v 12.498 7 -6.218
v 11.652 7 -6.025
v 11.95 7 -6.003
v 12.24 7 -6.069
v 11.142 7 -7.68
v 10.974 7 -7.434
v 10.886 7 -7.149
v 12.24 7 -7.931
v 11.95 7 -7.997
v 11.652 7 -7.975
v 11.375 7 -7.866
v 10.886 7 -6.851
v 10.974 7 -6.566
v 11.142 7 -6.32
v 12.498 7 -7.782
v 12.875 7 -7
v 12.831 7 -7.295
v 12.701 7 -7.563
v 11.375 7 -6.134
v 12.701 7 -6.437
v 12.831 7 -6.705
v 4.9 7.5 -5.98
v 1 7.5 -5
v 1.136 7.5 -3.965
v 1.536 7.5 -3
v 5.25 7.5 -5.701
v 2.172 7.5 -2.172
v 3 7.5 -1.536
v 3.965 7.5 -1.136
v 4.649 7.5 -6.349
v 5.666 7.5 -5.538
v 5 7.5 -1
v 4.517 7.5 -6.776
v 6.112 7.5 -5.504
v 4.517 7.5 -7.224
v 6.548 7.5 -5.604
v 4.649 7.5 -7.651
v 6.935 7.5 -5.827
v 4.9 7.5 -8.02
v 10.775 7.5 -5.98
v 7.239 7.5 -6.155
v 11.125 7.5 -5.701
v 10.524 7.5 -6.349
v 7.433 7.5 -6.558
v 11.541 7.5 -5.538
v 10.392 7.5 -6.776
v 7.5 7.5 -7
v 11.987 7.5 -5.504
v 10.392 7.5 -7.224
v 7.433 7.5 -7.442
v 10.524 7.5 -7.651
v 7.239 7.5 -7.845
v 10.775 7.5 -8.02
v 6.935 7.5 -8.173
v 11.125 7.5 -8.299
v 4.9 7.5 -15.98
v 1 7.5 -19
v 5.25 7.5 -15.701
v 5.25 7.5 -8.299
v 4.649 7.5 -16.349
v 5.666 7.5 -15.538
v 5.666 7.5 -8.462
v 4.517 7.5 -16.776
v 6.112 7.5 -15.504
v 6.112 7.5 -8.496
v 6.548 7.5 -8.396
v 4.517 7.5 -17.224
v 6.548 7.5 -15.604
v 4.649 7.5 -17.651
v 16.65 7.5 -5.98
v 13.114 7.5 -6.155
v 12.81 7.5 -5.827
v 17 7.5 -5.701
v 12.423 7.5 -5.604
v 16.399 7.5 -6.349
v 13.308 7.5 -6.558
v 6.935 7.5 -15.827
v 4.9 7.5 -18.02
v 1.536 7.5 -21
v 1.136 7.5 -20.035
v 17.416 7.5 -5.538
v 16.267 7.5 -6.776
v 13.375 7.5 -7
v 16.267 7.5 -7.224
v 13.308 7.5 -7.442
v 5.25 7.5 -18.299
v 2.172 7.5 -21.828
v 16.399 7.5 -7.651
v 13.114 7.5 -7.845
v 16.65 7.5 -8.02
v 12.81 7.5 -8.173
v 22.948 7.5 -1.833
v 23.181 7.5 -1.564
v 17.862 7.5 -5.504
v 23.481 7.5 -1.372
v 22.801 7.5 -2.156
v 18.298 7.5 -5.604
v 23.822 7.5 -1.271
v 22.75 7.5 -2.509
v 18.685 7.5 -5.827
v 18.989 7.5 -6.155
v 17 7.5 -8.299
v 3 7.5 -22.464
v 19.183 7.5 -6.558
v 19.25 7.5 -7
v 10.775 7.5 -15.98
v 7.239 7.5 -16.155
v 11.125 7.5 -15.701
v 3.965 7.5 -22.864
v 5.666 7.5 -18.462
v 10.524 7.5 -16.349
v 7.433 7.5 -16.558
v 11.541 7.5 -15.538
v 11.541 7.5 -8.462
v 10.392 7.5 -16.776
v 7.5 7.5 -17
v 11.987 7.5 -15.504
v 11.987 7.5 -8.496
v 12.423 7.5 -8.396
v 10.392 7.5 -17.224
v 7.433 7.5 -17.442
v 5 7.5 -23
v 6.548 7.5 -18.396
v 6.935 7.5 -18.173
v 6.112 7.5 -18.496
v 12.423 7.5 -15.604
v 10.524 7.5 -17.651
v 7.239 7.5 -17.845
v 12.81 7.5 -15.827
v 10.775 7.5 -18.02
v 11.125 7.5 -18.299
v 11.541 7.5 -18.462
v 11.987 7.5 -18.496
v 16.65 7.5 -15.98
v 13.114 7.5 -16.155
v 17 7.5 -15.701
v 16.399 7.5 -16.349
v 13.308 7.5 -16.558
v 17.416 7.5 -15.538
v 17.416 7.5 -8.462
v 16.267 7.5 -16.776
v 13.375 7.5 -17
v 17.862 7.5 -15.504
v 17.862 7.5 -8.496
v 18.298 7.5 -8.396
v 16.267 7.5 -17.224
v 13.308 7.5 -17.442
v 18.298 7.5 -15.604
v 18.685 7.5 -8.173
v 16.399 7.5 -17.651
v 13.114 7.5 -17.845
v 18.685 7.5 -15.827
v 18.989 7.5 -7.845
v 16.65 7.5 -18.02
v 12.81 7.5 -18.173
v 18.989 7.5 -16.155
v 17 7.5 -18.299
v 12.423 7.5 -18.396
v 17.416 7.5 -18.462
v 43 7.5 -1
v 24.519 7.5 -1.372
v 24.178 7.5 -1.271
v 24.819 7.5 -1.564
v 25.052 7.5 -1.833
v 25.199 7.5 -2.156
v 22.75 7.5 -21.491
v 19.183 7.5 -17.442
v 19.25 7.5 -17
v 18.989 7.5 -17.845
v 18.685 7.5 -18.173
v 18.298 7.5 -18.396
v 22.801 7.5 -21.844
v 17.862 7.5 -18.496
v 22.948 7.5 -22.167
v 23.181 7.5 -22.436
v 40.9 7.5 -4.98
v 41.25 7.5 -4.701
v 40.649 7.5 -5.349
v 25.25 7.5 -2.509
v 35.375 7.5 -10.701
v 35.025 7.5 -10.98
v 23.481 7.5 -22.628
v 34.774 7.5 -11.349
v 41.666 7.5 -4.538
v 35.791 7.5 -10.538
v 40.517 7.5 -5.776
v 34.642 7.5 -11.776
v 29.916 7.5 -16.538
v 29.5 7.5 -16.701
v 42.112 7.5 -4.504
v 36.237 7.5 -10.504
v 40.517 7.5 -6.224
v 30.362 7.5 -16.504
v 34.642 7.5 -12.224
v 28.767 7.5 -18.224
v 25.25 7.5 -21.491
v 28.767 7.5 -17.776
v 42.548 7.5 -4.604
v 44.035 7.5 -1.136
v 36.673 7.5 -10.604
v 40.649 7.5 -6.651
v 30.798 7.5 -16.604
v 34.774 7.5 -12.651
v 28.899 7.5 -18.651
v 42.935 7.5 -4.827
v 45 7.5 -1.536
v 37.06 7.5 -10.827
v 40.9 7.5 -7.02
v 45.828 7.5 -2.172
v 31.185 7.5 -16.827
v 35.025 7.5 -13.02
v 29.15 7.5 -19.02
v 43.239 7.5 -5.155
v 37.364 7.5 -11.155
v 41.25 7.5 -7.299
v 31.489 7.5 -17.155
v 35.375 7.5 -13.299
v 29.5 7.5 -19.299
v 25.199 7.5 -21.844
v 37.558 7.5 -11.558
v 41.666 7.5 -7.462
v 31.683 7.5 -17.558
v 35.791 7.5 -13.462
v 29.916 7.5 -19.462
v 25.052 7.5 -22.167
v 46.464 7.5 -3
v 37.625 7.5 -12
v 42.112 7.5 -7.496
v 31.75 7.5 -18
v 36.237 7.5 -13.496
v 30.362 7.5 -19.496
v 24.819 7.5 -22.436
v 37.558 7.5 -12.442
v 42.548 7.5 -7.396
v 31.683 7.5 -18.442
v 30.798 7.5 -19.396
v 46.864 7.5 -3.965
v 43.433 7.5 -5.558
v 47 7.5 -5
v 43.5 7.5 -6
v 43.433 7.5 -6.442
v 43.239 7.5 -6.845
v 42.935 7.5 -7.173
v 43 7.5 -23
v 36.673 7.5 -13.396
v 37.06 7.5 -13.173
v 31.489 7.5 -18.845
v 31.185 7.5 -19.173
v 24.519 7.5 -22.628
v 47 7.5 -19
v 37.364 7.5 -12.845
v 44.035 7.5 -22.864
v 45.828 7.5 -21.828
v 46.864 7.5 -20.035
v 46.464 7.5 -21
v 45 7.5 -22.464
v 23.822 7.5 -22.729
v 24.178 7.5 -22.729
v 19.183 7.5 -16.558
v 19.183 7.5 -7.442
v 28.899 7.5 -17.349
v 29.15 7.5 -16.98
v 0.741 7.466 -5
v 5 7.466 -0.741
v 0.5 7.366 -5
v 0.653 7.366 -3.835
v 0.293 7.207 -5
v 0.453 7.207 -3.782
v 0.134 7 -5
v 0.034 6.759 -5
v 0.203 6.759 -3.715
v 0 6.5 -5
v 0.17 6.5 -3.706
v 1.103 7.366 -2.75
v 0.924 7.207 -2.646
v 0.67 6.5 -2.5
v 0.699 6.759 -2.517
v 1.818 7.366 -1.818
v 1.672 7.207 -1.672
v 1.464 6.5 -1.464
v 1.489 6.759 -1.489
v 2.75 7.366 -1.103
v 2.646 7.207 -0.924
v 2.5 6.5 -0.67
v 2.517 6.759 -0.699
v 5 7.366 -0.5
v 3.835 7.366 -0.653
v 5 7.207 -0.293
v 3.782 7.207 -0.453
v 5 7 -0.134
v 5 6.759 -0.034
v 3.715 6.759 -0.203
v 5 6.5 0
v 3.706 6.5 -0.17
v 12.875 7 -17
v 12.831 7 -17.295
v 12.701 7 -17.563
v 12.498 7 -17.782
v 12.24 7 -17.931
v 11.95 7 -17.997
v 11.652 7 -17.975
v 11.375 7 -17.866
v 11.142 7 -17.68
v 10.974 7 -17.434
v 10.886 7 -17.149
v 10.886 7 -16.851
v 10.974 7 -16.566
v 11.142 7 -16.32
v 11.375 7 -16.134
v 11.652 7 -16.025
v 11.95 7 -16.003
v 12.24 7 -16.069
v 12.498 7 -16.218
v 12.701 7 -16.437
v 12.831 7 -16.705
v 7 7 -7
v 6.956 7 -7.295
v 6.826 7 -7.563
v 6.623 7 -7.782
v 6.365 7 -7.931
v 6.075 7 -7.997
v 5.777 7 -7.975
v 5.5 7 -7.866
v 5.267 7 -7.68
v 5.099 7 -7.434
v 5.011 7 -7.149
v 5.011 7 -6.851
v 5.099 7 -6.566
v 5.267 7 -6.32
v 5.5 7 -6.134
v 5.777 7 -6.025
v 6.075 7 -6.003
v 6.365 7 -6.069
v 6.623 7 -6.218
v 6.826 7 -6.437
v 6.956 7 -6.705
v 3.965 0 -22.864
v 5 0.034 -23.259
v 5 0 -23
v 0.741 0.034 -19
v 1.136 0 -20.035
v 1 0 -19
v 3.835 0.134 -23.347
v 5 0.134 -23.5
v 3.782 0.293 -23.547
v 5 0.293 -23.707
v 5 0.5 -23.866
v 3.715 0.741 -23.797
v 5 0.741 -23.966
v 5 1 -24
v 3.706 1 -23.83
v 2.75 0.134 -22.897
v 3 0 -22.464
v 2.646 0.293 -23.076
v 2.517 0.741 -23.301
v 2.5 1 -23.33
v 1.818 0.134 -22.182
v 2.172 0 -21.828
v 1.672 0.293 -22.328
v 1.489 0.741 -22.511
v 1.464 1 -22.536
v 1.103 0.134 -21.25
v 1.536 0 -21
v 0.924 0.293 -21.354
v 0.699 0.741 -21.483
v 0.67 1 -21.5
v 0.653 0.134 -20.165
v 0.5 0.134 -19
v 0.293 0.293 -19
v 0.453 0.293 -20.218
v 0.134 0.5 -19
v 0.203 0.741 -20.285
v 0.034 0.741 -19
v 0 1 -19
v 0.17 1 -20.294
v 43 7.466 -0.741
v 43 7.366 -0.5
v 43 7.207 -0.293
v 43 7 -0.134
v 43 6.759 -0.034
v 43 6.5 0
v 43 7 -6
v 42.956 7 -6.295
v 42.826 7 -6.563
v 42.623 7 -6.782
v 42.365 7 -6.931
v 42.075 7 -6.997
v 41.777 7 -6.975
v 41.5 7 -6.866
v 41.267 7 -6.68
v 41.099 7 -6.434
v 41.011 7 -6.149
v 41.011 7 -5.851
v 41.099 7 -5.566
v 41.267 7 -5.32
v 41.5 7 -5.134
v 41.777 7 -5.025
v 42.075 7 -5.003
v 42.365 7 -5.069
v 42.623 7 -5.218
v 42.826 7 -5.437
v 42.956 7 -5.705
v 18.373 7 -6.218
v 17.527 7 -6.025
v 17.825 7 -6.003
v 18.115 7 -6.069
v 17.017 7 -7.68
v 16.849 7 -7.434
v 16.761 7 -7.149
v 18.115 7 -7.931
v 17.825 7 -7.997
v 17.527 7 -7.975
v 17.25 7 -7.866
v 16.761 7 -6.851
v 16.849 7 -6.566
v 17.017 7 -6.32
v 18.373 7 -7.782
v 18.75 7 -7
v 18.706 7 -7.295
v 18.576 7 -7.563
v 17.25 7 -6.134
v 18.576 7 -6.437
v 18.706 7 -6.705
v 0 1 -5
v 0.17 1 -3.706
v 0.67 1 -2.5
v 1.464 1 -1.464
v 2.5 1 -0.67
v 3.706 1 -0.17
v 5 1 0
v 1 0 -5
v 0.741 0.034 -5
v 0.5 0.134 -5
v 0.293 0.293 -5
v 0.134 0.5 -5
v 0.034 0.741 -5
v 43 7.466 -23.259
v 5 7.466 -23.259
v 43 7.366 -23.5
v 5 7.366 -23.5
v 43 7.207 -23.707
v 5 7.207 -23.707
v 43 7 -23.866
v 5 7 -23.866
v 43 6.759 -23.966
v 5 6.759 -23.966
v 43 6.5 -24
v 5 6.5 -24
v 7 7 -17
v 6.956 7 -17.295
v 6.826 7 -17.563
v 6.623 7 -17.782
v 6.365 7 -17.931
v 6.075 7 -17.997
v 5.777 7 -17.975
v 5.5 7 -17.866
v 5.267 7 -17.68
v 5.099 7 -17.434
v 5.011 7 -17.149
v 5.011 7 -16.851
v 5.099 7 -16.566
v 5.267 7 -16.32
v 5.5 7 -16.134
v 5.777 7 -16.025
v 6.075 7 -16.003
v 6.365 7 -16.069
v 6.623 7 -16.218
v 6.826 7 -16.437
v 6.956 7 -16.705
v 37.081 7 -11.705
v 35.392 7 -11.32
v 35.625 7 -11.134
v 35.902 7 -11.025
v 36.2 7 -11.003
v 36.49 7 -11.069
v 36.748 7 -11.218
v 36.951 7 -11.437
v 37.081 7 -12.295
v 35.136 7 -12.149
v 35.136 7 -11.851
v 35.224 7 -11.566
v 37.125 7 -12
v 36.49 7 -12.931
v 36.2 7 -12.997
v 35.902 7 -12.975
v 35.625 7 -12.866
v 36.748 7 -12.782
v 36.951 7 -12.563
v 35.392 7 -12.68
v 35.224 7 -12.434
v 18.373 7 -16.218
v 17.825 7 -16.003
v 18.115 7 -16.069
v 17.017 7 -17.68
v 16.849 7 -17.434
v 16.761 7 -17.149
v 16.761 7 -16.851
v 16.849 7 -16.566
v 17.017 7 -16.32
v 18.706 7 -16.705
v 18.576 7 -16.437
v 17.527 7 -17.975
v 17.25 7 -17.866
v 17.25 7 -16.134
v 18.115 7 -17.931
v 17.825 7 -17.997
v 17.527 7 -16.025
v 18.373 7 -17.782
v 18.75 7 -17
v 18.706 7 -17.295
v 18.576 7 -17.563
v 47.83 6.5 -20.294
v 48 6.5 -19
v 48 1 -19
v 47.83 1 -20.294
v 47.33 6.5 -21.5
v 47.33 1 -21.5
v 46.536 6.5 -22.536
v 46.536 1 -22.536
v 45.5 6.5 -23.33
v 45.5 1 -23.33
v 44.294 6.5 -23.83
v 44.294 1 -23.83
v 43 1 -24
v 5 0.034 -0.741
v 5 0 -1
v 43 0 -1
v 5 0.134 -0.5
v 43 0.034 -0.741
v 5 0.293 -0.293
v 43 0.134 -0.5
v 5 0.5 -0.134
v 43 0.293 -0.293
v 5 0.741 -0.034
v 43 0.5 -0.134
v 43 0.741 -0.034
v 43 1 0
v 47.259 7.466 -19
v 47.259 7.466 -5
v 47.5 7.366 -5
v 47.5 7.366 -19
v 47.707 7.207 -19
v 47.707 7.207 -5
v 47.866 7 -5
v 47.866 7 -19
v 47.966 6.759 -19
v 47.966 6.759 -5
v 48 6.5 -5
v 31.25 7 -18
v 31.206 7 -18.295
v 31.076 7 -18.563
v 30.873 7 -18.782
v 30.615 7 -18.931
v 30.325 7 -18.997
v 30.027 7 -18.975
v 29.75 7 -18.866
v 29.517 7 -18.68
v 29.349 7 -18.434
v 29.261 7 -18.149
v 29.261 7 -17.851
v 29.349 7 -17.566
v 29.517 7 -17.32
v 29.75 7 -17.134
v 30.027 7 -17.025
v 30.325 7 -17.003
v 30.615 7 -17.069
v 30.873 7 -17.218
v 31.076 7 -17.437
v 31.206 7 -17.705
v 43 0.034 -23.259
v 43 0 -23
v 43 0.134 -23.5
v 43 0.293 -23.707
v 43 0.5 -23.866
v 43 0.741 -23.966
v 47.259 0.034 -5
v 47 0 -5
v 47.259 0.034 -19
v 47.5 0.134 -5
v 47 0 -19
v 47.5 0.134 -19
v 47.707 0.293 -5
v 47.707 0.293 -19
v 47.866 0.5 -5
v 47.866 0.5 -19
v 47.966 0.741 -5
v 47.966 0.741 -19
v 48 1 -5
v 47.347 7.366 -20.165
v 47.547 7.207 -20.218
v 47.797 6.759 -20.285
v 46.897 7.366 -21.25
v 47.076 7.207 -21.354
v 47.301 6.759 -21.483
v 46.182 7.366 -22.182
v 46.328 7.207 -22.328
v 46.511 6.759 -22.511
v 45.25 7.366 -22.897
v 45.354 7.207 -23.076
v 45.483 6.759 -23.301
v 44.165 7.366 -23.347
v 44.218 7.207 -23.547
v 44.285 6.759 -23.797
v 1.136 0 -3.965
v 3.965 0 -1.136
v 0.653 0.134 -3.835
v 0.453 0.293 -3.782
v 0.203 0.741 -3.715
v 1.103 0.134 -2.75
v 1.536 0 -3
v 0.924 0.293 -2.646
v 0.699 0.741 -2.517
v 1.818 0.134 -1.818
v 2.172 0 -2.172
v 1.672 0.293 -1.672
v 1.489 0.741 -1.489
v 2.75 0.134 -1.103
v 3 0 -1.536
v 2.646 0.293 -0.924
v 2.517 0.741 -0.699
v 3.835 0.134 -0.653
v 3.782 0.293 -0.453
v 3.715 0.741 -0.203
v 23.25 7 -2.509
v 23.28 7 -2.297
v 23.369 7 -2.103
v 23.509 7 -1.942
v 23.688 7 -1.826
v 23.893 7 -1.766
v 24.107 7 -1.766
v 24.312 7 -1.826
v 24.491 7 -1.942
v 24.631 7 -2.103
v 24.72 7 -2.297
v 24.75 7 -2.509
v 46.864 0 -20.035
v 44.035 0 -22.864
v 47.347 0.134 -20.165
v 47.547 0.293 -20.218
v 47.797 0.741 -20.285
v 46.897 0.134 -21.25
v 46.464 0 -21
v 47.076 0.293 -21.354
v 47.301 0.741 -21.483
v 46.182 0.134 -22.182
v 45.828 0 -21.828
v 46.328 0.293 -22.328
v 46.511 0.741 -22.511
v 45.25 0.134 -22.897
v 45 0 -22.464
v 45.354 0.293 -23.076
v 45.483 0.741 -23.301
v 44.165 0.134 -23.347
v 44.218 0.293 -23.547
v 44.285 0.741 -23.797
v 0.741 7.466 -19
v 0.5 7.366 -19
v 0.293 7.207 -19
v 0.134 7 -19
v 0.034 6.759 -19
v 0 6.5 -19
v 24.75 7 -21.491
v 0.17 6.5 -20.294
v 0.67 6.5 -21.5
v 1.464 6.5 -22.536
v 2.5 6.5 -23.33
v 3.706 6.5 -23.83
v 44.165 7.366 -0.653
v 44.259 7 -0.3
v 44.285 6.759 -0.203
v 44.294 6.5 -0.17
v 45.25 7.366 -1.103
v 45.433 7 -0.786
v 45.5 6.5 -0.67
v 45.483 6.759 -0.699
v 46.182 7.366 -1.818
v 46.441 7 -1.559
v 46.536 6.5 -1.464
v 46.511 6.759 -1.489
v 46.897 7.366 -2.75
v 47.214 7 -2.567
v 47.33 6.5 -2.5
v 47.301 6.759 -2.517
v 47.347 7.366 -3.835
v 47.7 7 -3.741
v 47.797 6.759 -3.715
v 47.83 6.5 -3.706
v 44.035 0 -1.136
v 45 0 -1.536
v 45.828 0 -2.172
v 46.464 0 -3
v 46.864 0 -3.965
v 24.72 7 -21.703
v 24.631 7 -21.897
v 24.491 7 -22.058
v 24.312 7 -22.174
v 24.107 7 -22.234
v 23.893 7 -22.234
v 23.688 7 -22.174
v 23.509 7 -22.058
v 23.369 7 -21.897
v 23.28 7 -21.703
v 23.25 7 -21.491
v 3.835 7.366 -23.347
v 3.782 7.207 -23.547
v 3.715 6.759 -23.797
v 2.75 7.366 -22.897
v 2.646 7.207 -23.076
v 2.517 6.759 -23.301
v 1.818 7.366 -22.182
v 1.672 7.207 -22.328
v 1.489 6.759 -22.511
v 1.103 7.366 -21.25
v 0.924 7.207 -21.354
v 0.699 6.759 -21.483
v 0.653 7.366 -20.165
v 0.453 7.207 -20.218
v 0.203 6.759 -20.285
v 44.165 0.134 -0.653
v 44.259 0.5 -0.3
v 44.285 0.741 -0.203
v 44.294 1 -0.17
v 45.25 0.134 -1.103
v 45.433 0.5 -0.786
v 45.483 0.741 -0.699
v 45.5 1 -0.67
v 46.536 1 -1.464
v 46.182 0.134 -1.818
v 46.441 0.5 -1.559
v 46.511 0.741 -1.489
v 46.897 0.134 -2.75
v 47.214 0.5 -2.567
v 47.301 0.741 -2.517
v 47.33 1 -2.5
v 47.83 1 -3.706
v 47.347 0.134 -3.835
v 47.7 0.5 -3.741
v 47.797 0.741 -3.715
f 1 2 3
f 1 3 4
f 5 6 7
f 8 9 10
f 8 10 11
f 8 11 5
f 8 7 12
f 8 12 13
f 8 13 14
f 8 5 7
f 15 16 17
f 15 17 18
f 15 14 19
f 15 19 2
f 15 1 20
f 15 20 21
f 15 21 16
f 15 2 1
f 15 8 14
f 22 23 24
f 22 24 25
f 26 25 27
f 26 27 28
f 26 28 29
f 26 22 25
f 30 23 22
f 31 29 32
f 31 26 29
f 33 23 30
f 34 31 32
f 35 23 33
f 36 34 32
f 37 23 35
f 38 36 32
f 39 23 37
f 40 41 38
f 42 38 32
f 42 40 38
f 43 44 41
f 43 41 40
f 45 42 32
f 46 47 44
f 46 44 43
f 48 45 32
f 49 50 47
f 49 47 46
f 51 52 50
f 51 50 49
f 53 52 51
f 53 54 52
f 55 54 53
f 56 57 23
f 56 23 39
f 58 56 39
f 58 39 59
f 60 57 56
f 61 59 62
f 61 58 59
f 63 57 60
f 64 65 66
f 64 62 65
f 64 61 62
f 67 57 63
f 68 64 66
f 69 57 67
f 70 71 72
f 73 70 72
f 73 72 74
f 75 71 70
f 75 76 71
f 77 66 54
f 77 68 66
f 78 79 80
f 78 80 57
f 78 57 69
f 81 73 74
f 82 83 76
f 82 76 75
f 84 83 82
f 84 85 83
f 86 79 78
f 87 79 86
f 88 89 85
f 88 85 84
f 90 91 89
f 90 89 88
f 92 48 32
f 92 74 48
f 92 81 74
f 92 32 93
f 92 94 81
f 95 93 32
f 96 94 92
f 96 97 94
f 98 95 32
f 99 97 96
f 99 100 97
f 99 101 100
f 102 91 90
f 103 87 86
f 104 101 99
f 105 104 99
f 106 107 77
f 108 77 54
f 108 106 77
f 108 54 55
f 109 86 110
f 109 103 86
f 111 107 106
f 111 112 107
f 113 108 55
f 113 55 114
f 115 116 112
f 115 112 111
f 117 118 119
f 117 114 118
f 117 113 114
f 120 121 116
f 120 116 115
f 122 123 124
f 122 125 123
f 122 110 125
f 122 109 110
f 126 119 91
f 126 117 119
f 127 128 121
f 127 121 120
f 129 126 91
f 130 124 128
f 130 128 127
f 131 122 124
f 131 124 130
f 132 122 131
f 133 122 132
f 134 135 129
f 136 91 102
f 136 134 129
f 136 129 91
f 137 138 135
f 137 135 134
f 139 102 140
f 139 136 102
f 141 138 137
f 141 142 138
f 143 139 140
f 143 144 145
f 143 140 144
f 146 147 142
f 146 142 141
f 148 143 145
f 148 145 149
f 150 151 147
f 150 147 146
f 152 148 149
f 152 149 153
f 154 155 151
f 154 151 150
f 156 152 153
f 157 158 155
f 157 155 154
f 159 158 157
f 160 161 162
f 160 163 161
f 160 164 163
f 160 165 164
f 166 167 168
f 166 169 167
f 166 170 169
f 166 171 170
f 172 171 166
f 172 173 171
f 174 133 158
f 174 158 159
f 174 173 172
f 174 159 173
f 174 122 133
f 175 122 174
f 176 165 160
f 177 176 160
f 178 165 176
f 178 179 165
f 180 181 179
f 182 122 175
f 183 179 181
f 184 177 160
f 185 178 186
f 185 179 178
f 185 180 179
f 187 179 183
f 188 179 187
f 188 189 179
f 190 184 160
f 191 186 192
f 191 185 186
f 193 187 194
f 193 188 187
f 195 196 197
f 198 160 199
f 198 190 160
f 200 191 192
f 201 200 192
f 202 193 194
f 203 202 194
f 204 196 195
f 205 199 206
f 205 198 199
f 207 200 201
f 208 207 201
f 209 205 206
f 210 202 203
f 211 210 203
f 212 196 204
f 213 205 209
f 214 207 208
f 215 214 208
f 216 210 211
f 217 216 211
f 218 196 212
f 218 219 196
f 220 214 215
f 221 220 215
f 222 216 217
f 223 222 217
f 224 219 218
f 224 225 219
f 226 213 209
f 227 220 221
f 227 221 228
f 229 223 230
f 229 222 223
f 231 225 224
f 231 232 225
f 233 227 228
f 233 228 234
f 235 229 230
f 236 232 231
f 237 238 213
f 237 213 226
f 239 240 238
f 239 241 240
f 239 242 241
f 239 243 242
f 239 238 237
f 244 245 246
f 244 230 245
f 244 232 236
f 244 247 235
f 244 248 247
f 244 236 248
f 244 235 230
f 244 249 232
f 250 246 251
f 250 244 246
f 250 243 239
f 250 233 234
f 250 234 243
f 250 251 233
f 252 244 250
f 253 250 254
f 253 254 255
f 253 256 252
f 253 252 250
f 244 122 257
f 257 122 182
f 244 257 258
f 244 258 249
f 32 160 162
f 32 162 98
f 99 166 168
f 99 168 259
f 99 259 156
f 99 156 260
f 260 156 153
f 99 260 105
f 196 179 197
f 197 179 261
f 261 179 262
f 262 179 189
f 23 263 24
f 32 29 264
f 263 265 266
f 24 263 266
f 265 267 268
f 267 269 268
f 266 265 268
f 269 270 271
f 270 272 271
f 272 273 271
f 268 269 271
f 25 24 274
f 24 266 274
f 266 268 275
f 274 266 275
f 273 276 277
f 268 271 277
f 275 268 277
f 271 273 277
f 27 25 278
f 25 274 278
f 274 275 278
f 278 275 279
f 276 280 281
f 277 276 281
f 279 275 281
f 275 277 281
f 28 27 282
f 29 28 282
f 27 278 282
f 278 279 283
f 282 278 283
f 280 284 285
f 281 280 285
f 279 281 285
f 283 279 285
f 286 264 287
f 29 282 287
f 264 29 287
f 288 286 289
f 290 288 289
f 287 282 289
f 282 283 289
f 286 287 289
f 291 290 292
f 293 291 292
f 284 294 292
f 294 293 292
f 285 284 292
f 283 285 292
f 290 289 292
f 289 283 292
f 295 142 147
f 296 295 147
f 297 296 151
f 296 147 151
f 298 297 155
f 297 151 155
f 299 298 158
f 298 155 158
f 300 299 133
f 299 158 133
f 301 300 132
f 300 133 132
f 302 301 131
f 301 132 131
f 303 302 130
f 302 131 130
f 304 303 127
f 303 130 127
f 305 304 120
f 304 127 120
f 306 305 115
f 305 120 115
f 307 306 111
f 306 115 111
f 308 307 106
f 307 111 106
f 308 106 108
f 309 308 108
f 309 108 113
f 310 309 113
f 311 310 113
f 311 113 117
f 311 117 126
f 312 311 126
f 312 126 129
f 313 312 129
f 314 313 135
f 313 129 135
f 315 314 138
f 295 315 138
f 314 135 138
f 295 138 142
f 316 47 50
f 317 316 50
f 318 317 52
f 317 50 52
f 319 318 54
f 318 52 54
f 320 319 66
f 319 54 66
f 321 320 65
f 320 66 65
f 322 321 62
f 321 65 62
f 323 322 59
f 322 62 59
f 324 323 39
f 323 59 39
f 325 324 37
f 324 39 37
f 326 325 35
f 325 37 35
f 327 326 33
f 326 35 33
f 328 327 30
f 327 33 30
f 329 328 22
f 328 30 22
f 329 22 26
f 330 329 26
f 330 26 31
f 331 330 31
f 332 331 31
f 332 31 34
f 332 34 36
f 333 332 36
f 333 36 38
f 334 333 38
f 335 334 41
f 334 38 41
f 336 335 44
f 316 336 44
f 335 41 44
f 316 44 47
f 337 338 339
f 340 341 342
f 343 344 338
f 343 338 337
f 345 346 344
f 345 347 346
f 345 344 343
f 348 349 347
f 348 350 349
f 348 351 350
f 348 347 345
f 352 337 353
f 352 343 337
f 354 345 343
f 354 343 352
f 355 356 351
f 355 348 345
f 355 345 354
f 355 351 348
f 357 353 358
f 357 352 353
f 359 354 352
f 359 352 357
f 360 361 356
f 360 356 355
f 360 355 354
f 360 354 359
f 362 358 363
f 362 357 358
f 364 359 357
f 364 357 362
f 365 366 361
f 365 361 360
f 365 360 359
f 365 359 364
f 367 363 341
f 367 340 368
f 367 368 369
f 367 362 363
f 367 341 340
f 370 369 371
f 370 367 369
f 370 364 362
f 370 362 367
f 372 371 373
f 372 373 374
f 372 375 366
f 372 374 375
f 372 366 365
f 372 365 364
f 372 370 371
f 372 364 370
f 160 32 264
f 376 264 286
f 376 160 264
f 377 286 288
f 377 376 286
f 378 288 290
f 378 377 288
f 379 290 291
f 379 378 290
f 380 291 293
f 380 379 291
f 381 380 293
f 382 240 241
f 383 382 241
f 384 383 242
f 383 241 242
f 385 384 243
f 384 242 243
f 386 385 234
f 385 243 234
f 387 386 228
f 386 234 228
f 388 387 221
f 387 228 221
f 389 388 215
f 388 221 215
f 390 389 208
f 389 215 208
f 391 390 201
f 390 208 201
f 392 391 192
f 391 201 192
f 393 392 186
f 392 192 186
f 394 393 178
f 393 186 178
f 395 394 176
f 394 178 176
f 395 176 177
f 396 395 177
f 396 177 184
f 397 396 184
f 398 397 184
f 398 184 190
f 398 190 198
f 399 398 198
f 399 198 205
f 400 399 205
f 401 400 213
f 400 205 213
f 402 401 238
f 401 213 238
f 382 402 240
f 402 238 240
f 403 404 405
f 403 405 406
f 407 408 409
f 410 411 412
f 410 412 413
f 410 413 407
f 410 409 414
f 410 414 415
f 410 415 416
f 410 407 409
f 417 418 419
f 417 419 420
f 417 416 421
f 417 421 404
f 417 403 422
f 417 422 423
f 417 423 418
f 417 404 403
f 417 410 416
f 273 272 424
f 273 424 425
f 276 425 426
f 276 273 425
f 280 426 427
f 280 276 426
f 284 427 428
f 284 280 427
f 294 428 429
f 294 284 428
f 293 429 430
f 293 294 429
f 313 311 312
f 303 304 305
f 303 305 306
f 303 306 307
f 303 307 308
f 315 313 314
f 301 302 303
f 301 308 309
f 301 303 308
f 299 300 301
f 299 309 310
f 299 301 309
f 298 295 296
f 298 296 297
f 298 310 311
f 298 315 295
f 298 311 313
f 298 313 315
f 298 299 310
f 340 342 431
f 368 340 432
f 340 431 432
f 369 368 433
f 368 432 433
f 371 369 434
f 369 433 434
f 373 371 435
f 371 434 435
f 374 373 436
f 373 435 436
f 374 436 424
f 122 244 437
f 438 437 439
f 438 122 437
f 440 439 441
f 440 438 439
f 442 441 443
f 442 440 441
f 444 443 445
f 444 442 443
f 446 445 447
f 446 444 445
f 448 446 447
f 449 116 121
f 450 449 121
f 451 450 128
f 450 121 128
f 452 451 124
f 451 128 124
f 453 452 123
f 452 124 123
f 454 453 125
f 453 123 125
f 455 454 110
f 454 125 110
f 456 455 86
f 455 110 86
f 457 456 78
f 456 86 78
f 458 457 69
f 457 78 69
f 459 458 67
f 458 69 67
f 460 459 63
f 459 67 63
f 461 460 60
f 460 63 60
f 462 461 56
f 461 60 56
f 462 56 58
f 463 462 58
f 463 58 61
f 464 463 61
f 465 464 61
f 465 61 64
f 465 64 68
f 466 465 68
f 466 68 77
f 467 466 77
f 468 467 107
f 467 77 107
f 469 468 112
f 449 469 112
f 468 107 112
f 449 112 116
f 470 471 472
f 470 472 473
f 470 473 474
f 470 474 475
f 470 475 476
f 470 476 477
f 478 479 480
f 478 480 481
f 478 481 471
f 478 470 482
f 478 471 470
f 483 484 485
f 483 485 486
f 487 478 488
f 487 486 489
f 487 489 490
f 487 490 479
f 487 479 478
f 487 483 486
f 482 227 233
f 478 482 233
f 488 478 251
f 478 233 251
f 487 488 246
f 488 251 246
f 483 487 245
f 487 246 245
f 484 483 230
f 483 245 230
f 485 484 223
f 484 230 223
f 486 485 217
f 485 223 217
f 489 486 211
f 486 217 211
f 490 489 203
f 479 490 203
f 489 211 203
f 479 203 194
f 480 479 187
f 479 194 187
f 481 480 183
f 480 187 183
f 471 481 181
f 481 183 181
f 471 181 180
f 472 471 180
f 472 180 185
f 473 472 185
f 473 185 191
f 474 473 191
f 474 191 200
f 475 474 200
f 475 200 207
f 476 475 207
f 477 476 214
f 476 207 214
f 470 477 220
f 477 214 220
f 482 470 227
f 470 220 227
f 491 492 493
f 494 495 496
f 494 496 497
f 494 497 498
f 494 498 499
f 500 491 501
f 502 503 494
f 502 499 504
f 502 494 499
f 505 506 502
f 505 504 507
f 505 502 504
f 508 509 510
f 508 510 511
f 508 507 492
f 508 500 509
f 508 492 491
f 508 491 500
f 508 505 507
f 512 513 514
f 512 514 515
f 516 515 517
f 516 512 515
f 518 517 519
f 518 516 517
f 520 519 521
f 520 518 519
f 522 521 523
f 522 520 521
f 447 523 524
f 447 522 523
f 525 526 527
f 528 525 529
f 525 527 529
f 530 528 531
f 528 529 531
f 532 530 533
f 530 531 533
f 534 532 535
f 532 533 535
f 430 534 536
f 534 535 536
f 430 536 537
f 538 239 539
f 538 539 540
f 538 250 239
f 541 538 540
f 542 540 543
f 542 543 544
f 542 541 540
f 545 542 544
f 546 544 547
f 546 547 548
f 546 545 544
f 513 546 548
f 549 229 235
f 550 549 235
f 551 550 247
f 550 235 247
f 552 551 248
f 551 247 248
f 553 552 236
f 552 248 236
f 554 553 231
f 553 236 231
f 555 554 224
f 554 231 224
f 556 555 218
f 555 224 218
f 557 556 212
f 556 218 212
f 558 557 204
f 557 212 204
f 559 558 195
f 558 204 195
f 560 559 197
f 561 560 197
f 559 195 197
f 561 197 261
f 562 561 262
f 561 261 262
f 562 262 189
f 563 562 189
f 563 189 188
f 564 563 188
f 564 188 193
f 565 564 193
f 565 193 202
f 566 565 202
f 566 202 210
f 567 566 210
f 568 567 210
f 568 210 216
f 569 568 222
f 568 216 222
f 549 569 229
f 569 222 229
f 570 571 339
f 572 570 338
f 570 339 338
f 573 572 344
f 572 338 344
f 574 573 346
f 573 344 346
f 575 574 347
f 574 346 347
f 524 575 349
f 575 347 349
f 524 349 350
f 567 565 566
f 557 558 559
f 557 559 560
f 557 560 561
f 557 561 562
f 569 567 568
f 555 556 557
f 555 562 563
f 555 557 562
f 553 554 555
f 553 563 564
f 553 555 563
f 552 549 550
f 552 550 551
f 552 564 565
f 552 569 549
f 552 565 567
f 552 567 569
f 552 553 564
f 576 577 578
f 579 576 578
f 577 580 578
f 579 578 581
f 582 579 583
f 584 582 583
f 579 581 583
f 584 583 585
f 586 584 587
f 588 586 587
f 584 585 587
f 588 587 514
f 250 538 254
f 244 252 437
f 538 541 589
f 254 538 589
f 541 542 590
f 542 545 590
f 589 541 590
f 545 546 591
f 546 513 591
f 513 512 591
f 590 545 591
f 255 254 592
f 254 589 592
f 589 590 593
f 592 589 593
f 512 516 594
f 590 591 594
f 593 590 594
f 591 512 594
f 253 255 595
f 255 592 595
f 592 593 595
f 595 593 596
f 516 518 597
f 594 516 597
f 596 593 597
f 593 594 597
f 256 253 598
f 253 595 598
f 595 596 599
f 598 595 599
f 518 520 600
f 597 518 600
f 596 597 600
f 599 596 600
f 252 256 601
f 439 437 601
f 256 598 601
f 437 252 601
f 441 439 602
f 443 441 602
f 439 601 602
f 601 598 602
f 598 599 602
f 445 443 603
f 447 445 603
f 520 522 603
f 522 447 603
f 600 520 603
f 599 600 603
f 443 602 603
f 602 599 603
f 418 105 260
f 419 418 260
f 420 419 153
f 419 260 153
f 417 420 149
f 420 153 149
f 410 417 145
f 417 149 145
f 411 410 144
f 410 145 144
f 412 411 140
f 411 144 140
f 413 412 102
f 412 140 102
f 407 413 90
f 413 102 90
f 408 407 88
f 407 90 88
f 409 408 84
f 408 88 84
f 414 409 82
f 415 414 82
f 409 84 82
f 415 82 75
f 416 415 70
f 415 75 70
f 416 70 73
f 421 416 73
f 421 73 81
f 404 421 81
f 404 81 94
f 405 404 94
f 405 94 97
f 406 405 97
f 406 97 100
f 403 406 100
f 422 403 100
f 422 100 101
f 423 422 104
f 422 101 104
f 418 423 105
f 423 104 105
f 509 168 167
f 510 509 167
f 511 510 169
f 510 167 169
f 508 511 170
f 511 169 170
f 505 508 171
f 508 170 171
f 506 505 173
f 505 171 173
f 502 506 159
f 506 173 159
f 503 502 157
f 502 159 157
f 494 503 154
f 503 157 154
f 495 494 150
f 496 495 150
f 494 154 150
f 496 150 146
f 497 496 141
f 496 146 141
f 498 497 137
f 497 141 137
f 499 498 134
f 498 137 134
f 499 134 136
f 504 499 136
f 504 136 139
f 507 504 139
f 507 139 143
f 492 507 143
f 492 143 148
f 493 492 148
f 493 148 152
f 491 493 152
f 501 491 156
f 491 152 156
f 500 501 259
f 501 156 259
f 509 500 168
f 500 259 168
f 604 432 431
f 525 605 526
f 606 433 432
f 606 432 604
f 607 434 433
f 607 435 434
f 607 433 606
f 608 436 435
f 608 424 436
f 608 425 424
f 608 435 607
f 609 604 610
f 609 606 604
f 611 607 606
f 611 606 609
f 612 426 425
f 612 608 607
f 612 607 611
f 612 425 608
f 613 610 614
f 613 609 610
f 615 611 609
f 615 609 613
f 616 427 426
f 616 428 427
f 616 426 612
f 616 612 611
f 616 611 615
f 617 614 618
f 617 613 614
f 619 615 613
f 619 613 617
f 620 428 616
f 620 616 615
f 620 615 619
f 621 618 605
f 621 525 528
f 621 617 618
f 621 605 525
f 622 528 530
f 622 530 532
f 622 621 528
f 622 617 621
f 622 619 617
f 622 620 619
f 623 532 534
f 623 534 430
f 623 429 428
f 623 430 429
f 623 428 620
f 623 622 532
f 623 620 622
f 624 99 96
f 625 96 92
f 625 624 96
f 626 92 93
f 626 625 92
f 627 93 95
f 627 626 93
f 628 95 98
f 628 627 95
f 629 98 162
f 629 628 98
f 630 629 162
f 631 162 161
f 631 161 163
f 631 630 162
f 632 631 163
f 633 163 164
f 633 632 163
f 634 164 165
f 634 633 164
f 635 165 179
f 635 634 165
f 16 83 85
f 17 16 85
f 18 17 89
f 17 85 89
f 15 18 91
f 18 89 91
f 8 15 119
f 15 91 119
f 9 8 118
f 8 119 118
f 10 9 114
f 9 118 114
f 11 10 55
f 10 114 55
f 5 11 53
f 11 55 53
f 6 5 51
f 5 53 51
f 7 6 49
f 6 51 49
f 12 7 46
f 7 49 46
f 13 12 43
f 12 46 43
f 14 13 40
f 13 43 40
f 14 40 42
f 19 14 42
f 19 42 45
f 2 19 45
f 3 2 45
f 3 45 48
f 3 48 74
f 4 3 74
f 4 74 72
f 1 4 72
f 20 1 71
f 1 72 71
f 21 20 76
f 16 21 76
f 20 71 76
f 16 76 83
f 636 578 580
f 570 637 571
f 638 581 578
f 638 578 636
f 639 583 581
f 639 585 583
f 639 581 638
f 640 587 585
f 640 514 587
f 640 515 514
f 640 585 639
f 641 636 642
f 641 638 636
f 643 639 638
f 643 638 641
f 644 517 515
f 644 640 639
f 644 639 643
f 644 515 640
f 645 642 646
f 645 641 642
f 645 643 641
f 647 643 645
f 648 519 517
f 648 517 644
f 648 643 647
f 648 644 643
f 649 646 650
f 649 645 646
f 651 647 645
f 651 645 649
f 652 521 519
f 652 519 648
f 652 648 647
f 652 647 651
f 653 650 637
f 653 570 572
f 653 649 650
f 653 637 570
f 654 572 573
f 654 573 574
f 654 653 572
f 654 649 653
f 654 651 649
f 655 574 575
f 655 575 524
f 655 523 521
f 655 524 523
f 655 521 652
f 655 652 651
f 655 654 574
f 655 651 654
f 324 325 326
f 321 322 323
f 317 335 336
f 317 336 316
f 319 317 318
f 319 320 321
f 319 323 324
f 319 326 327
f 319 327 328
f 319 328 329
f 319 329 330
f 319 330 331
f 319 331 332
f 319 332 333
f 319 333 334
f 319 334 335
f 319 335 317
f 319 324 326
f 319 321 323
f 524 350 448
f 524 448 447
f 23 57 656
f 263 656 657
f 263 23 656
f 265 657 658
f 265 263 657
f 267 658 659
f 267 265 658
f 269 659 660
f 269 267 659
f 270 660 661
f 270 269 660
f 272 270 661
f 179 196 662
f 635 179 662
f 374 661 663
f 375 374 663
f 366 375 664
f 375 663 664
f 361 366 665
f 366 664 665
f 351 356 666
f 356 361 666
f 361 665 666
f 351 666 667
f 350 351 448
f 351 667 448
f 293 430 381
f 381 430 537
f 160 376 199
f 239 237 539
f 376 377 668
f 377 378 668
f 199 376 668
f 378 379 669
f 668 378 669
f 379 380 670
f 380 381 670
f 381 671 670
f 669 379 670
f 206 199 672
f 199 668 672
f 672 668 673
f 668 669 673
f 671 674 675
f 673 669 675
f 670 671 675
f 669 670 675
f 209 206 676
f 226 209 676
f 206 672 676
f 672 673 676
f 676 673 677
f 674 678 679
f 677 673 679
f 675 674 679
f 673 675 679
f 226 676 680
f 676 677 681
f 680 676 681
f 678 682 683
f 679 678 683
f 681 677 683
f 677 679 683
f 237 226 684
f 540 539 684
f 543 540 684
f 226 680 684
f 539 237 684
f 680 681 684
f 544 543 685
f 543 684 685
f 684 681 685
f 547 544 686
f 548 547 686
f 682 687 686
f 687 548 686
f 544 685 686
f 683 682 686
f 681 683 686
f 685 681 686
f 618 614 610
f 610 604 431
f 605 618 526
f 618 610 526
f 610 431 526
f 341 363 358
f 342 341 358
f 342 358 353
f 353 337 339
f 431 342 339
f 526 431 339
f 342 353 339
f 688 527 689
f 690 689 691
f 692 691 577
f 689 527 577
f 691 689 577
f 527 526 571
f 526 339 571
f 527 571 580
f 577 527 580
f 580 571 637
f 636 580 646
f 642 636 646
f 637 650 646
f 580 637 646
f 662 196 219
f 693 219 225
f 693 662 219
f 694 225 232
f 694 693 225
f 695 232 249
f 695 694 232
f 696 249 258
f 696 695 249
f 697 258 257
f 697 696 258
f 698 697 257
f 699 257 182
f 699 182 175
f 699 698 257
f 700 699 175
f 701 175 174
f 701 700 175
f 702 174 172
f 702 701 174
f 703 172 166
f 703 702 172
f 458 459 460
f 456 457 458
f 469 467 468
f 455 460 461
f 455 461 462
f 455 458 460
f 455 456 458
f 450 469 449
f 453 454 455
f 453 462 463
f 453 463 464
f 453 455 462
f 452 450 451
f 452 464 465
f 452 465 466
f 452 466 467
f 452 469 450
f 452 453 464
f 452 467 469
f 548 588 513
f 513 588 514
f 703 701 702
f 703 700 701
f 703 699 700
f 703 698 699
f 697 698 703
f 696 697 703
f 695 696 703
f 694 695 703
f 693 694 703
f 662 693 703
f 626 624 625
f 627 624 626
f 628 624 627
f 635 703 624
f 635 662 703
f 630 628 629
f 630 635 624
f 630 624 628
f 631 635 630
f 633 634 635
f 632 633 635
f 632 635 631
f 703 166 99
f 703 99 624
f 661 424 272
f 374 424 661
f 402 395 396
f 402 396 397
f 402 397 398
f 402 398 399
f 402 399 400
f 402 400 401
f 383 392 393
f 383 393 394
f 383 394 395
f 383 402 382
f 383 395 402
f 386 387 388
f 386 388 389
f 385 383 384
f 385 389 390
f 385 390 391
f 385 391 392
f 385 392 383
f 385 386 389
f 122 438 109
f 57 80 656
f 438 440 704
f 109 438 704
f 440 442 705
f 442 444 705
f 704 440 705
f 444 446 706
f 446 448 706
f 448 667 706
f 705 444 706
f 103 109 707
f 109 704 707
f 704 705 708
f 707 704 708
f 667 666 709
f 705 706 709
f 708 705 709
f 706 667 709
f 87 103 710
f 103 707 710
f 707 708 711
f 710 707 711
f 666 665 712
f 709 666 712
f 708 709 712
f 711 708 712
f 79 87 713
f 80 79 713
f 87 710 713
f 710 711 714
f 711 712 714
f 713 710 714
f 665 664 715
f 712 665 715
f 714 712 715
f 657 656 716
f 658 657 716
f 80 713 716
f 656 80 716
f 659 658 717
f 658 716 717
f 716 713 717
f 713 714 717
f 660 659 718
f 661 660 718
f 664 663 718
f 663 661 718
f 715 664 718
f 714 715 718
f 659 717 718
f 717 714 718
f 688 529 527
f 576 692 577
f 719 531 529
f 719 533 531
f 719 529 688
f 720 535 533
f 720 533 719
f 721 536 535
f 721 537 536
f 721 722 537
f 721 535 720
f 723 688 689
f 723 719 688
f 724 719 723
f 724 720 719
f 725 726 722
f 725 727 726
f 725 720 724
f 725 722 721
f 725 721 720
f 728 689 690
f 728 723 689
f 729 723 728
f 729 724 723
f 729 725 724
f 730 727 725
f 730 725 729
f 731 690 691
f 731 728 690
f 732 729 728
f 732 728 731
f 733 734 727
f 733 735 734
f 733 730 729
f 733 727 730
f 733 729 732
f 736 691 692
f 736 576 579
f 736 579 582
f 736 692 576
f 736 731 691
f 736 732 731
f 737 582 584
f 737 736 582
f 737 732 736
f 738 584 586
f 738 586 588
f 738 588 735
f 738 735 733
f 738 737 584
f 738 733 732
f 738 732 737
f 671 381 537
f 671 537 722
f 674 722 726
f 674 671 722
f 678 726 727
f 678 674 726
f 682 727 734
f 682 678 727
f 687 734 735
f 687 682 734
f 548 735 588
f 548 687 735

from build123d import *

# Parameters (mm, degrees)
ESQUISSE1_W                = 48
ESQUISSE1_H                = 24
EXTRUSION1_DEPTH           = 7.5
CONG_2_R                   = 5
CONG_5_R                   = 1
CONG_6_R                   = 1
ESQUISSE4_W                = 0.5
ESQUISSE4_H                = 18.982849842
EXTRUSION2_DEPTH           = 0.5
ESQUISSE5_R                = 0.25
EXTRUSION3_DEPTH           = 0.5
CHANFREIN1_SIZE            = 1
ESQUISSE6_R                = 1.5
EXTRUSION6_DEPTH           = 0.5
EXTRUSION6_DRAFT           = -45
EXTRUSION6_PROFILE_2_DEPTH = 0.5
EXTRUSION6_PROFILE_2_DRAFT = -45
EXTRUSION6_PROFILE_3_DEPTH = 0.5
EXTRUSION6_PROFILE_3_DRAFT = -45
EXTRUSION6_PROFILE_4_DEPTH = 0.5
EXTRUSION6_PROFILE_4_DRAFT = -45
EXTRUSION6_PROFILE_5_DEPTH = 0.5
EXTRUSION6_PROFILE_5_DRAFT = -45
EXTRUSION6_PROFILE_6_DEPTH = 0.5
EXTRUSION6_PROFILE_6_DRAFT = -45
EXTRUSION6_PROFILE_7_DEPTH = 0.5
EXTRUSION6_PROFILE_7_DRAFT = -45
EXTRUSION6_PROFILE_8_DEPTH = 0.5
EXTRUSION6_PROFILE_8_DRAFT = -45
EXTRUSION6_PROFILE_9_DEPTH = 0.5
EXTRUSION6_PROFILE_9_DRAFT = -45


with BuildPart() as part:
    # Esquisse1 → Extrusion1 (new body)
    with BuildSketch(Plane(origin=(0, 0, 0), x_dir=(1, 0, 0), z_dir=(0, 1, 0))):
        with Locations((24, 12)):
            Rectangle(ESQUISSE1_W, ESQUISSE1_H)
    extrude(amount=EXTRUSION1_DEPTH)

    # Congé2
    cong_2_edges = [part.edges().sort_by_distance(p)[0] for p in [
        (0, 3.75, -24),
        (48, 3.75, -24),
        (48, 3.75, 0),
        (0, 3.75, 0),
    ]]
    fillet(cong_2_edges, radius=CONG_2_R)

    # Congé5
    cong_5_edges = [part.edges().sort_by_distance(p)[0] for p in [
        (48, 7.5, -12),
        (24, 7.5, 0),
        (0, 7.5, -12),
        (24, 7.5, -24),
        (1.464466094, 7.5, -22.535533906),
        (1.464466094, 7.5, -1.464466094),
        (46.535533906, 7.5, -22.535533906),
        (46.535533906, 7.5, -1.464466094),
    ]]
    fillet(cong_5_edges, radius=CONG_5_R)

    # Congé6
    cong_6_edges = [part.edges().sort_by_distance(p)[0] for p in [
        (48, 0, -12),
        (0, 0, -12),
        (24, 0, -24),
        (24, 0, 0),
        (1.464466094, 0, -22.535533906),
        (1.464466094, 0, -1.464466094),
        (46.535533906, 0, -22.535533906),
        (46.535533906, 0, -1.464466094),
    ]]
    fillet(cong_6_edges, radius=CONG_6_R)

    # Esquisse4 → Extrusion2 (cut)
    with BuildSketch(Plane(origin=(0, 7.5, 0), x_dir=(1, 0, 0), z_dir=(0, 1, 0))):
        with Locations((24, 12)):
            Rectangle(ESQUISSE4_W, ESQUISSE4_H)
    extrude(amount=-EXTRUSION2_DEPTH, mode=Mode.SUBTRACT)

    # Esquisse5 → Extrusion3 (cut)
    with BuildSketch(Plane(origin=(0, 7.5, 0), x_dir=(1, 0, 0), z_dir=(0, 1, 0))):
        with Locations((24, 21.491424921)):
            Circle(ESQUISSE5_R)
        with Locations((24, 2.508575079)):
            Circle(ESQUISSE5_R)
    extrude(amount=-EXTRUSION3_DEPTH, mode=Mode.SUBTRACT)

    # Chanfrein1
    # the kernel refuses this chamfer: 1 mm, written as the material it takes off along each edge
    with BuildSketch(Plane(origin=(24, 7.5, -21.491424921), x_dir=(1, 0, 0), z_dir=(0, 0, 1))) as chanfrein1_piece_1_section:
        Polygon((0.25 + CHANFREIN1_SIZE, 0), (0.25, -CHANFREIN1_SIZE), (0.25, 0), align=None)
    chanfrein1_piece_1 = revolve(axis=Axis((24, 7.5, -21.491424921), (0, 1, 0)), revolution_arc=180, mode=Mode.PRIVATE)
    chanfrein1_piece_1 = split(chanfrein1_piece_1, bisect_by=Plane(origin=(24, 7, -21.964580549), z_dir=(0, 1, 0)), keep=Keep.TOP, mode=Mode.PRIVATE)
    add(chanfrein1_piece_1, mode=Mode.SUBTRACT)
    with BuildSketch(Plane(origin=(24.25, 7.5, -21.491424921), x_dir=(0.9996219169112968, 0.02749587661058651, 0), z_dir=(0, 0, 1))) as chanfrein1_piece_2_section:
        Polygon((CHANFREIN1_SIZE * 0.999621916911, -CHANFREIN1_SIZE * 0.0274958766106), (-CHANFREIN1_SIZE * 0.0274958766106, -CHANFREIN1_SIZE * 0.999621916911), (0, 0), align=None)
    chanfrein1_piece_2 = extrude(amount=18.982849842, mode=Mode.PRIVATE)
    chanfrein1_piece_2 = split(chanfrein1_piece_2, bisect_by=Plane(origin=(24.643401084, 7, -12), z_dir=(0, 1, 0)), keep=Keep.TOP, mode=Mode.PRIVATE)
    add(chanfrein1_piece_2, mode=Mode.SUBTRACT)
    with BuildSketch(Plane(origin=(24, 7.5, -2.508575079), x_dir=(-1, 0, 0), z_dir=(0, 0, -1))) as chanfrein1_piece_3_section:
        Polygon((0.25 + CHANFREIN1_SIZE, 0), (0.25, -CHANFREIN1_SIZE), (0.25, 0), align=None)
    chanfrein1_piece_3 = revolve(axis=Axis((24, 7.5, -2.508575079), (0, 1, 0)), revolution_arc=180, mode=Mode.PRIVATE)
    chanfrein1_piece_3 = split(chanfrein1_piece_3, bisect_by=Plane(origin=(24, 7, -2.035419451), z_dir=(0, 1, 0)), keep=Keep.TOP, mode=Mode.PRIVATE)
    add(chanfrein1_piece_3, mode=Mode.SUBTRACT)
    with BuildSketch(Plane(origin=(23.75, 7.5, -2.508575079), x_dir=(-0.9996219169112968, 0.02749587661058651, 0), z_dir=(0, 0, -1))) as chanfrein1_piece_4_section:
        Polygon((CHANFREIN1_SIZE * 0.999621916911, -CHANFREIN1_SIZE * 0.0274958766106), (-CHANFREIN1_SIZE * 0.0274958766106, -CHANFREIN1_SIZE * 0.999621916911), (0, 0), align=None)
    chanfrein1_piece_4 = extrude(amount=18.982849842, mode=Mode.PRIVATE)
    chanfrein1_piece_4 = split(chanfrein1_piece_4, bisect_by=Plane(origin=(23.356598916, 7, -12), z_dir=(0, 1, 0)), keep=Keep.TOP, mode=Mode.PRIVATE)
    add(chanfrein1_piece_4, mode=Mode.SUBTRACT)


with BuildPart() as extrusion6_tool:
    # Esquisse6 → Extrusion6 (with draft: the straight prism first)
    with BuildSketch(Plane(origin=(0, 7.5, 0), x_dir=(1, 0, 0), z_dir=(0, 1, 0))):
        with Locations((42, 6)):
            Circle(ESQUISSE6_R)
    extrude(amount=-EXTRUSION6_DEPTH)
    # Extrusion6: the draft: its side faces are tilted about the plane it starts from
    extrusion6_sides = [extrusion6_tool.faces().sort_by_distance(p)[0] for p in [
        (40.5, 7.25, -6),
    ]]
    draft(extrusion6_sides, Plane(origin=(0, 7.5, 0), x_dir=(1, 0, 0), z_dir=(0, 1, 0)), EXTRUSION6_DRAFT)


with BuildPart() as part_1:
    add(part.part)

    # Extrusion6: cut by extrusion6_tool
    add(extrusion6_tool.part, mode=Mode.SUBTRACT)


with BuildPart() as extrusion6_profile_2_tool:
    # Esquisse6 → Extrusion6 profile 2 (with draft: the straight prism first)
    with BuildSketch(Plane(origin=(0, 7.5, 0), x_dir=(1, 0, 0), z_dir=(0, 1, 0))):
        with Locations((30.25, 18)):
            Circle(ESQUISSE6_R)
    extrude(amount=-EXTRUSION6_PROFILE_2_DEPTH)
    # Extrusion6 profile 2: the draft: its side faces are tilted about the plane it starts from
    extrusion6_profile_2_sides = [extrusion6_profile_2_tool.faces().sort_by_distance(p)[0] for p in [
        (28.75, 7.25, -18),
    ]]
    draft(extrusion6_profile_2_sides, Plane(origin=(0, 7.5, 0), x_dir=(1, 0, 0), z_dir=(0, 1, 0)), EXTRUSION6_PROFILE_2_DRAFT)


with BuildPart() as part_2:
    add(part_1.part)

    # Extrusion6 profile 2: cut by extrusion6_profile_2_tool
    add(extrusion6_profile_2_tool.part, mode=Mode.SUBTRACT)


with BuildPart() as extrusion6_profile_3_tool:
    # Esquisse6 → Extrusion6 profile 3 (with draft: the straight prism first)
    with BuildSketch(Plane(origin=(0, 7.5, 0), x_dir=(1, 0, 0), z_dir=(0, 1, 0))):
        with Locations((11.875, 17)):
            Circle(ESQUISSE6_R)
    extrude(amount=-EXTRUSION6_PROFILE_3_DEPTH)
    # Extrusion6 profile 3: the draft: its side faces are tilted about the plane it starts from
    extrusion6_profile_3_sides = [extrusion6_profile_3_tool.faces().sort_by_distance(p)[0] for p in [
        (10.375, 7.25, -17),
    ]]
    draft(extrusion6_profile_3_sides, Plane(origin=(0, 7.5, 0), x_dir=(1, 0, 0), z_dir=(0, 1, 0)), EXTRUSION6_PROFILE_3_DRAFT)


with BuildPart() as part_3:
    add(part_2.part)

    # Extrusion6 profile 3: cut by extrusion6_profile_3_tool
    add(extrusion6_profile_3_tool.part, mode=Mode.SUBTRACT)


with BuildPart() as extrusion6_profile_4_tool:
    # Esquisse6 → Extrusion6 profile 4 (with draft: the straight prism first)
    with BuildSketch(Plane(origin=(0, 7.5, 0), x_dir=(1, 0, 0), z_dir=(0, 1, 0))):
        with Locations((17.75, 17)):
            Circle(ESQUISSE6_R)
    extrude(amount=-EXTRUSION6_PROFILE_4_DEPTH)
    # Extrusion6 profile 4: the draft: its side faces are tilted about the plane it starts from
    extrusion6_profile_4_sides = [extrusion6_profile_4_tool.faces().sort_by_distance(p)[0] for p in [
        (16.25, 7.25, -17),
    ]]
    draft(extrusion6_profile_4_sides, Plane(origin=(0, 7.5, 0), x_dir=(1, 0, 0), z_dir=(0, 1, 0)), EXTRUSION6_PROFILE_4_DRAFT)


with BuildPart() as part_4:
    add(part_3.part)

    # Extrusion6 profile 4: cut by extrusion6_profile_4_tool
    add(extrusion6_profile_4_tool.part, mode=Mode.SUBTRACT)


with BuildPart() as extrusion6_profile_5_tool:
    # Esquisse6 → Extrusion6 profile 5 (with draft: the straight prism first)
    with BuildSketch(Plane(origin=(0, 7.5, 0), x_dir=(1, 0, 0), z_dir=(0, 1, 0))):
        with Locations((6, 17)):
            Circle(ESQUISSE6_R)
    extrude(amount=-EXTRUSION6_PROFILE_5_DEPTH)
    # Extrusion6 profile 5: the draft: its side faces are tilted about the plane it starts from
    extrusion6_profile_5_sides = [extrusion6_profile_5_tool.faces().sort_by_distance(p)[0] for p in [
        (4.5, 7.25, -17),
    ]]
    draft(extrusion6_profile_5_sides, Plane(origin=(0, 7.5, 0), x_dir=(1, 0, 0), z_dir=(0, 1, 0)), EXTRUSION6_PROFILE_5_DRAFT)


with BuildPart() as part_5:
    add(part_4.part)

    # Extrusion6 profile 5: cut by extrusion6_profile_5_tool
    add(extrusion6_profile_5_tool.part, mode=Mode.SUBTRACT)


with BuildPart() as extrusion6_profile_6_tool:
    # Esquisse6 → Extrusion6 profile 6 (with draft: the straight prism first)
    with BuildSketch(Plane(origin=(0, 7.5, 0), x_dir=(1, 0, 0), z_dir=(0, 1, 0))):
        with Locations((11.875, 7)):
            Circle(ESQUISSE6_R)
    extrude(amount=-EXTRUSION6_PROFILE_6_DEPTH)
    # Extrusion6 profile 6: the draft: its side faces are tilted about the plane it starts from
    extrusion6_profile_6_sides = [extrusion6_profile_6_tool.faces().sort_by_distance(p)[0] for p in [
        (10.375, 7.25, -7),
    ]]
    draft(extrusion6_profile_6_sides, Plane(origin=(0, 7.5, 0), x_dir=(1, 0, 0), z_dir=(0, 1, 0)), EXTRUSION6_PROFILE_6_DRAFT)


with BuildPart() as part_6:
    add(part_5.part)

    # Extrusion6 profile 6: cut by extrusion6_profile_6_tool
    add(extrusion6_profile_6_tool.part, mode=Mode.SUBTRACT)


with BuildPart() as extrusion6_profile_7_tool:
    # Esquisse6 → Extrusion6 profile 7 (with draft: the straight prism first)
    with BuildSketch(Plane(origin=(0, 7.5, 0), x_dir=(1, 0, 0), z_dir=(0, 1, 0))):
        with Locations((6, 7)):
            Circle(ESQUISSE6_R)
    extrude(amount=-EXTRUSION6_PROFILE_7_DEPTH)
    # Extrusion6 profile 7: the draft: its side faces are tilted about the plane it starts from
    extrusion6_profile_7_sides = [extrusion6_profile_7_tool.faces().sort_by_distance(p)[0] for p in [
        (4.5, 7.25, -7),
    ]]
    draft(extrusion6_profile_7_sides, Plane(origin=(0, 7.5, 0), x_dir=(1, 0, 0), z_dir=(0, 1, 0)), EXTRUSION6_PROFILE_7_DRAFT)


with BuildPart() as part_7:
    add(part_6.part)

    # Extrusion6 profile 7: cut by extrusion6_profile_7_tool
    add(extrusion6_profile_7_tool.part, mode=Mode.SUBTRACT)


with BuildPart() as extrusion6_profile_8_tool:
    # Esquisse6 → Extrusion6 profile 8 (with draft: the straight prism first)
    with BuildSketch(Plane(origin=(0, 7.5, 0), x_dir=(1, 0, 0), z_dir=(0, 1, 0))):
        with Locations((17.75, 7)):
            Circle(ESQUISSE6_R)
    extrude(amount=-EXTRUSION6_PROFILE_8_DEPTH)
    # Extrusion6 profile 8: the draft: its side faces are tilted about the plane it starts from
    extrusion6_profile_8_sides = [extrusion6_profile_8_tool.faces().sort_by_distance(p)[0] for p in [
        (16.25, 7.25, -7),
    ]]
    draft(extrusion6_profile_8_sides, Plane(origin=(0, 7.5, 0), x_dir=(1, 0, 0), z_dir=(0, 1, 0)), EXTRUSION6_PROFILE_8_DRAFT)


with BuildPart() as part_8:
    add(part_7.part)

    # Extrusion6 profile 8: cut by extrusion6_profile_8_tool
    add(extrusion6_profile_8_tool.part, mode=Mode.SUBTRACT)


with BuildPart() as extrusion6_profile_9_tool:
    # Esquisse6 → Extrusion6 profile 9 (with draft: the straight prism first)
    with BuildSketch(Plane(origin=(0, 7.5, 0), x_dir=(1, 0, 0), z_dir=(0, 1, 0))):
        with Locations((36.125, 12)):
            Circle(ESQUISSE6_R)
    extrude(amount=-EXTRUSION6_PROFILE_9_DEPTH)
    # Extrusion6 profile 9: the draft: its side faces are tilted about the plane it starts from
    extrusion6_profile_9_sides = [extrusion6_profile_9_tool.faces().sort_by_distance(p)[0] for p in [
        (34.625, 7.25, -12),
    ]]
    draft(extrusion6_profile_9_sides, Plane(origin=(0, 7.5, 0), x_dir=(1, 0, 0), z_dir=(0, 1, 0)), EXTRUSION6_PROFILE_9_DRAFT)


with BuildPart() as part_9:
    add(part_8.part)

    # Extrusion6 profile 9: cut by extrusion6_profile_9_tool
    add(extrusion6_profile_9_tool.part, mode=Mode.SUBTRACT)


solid = part_9.part
